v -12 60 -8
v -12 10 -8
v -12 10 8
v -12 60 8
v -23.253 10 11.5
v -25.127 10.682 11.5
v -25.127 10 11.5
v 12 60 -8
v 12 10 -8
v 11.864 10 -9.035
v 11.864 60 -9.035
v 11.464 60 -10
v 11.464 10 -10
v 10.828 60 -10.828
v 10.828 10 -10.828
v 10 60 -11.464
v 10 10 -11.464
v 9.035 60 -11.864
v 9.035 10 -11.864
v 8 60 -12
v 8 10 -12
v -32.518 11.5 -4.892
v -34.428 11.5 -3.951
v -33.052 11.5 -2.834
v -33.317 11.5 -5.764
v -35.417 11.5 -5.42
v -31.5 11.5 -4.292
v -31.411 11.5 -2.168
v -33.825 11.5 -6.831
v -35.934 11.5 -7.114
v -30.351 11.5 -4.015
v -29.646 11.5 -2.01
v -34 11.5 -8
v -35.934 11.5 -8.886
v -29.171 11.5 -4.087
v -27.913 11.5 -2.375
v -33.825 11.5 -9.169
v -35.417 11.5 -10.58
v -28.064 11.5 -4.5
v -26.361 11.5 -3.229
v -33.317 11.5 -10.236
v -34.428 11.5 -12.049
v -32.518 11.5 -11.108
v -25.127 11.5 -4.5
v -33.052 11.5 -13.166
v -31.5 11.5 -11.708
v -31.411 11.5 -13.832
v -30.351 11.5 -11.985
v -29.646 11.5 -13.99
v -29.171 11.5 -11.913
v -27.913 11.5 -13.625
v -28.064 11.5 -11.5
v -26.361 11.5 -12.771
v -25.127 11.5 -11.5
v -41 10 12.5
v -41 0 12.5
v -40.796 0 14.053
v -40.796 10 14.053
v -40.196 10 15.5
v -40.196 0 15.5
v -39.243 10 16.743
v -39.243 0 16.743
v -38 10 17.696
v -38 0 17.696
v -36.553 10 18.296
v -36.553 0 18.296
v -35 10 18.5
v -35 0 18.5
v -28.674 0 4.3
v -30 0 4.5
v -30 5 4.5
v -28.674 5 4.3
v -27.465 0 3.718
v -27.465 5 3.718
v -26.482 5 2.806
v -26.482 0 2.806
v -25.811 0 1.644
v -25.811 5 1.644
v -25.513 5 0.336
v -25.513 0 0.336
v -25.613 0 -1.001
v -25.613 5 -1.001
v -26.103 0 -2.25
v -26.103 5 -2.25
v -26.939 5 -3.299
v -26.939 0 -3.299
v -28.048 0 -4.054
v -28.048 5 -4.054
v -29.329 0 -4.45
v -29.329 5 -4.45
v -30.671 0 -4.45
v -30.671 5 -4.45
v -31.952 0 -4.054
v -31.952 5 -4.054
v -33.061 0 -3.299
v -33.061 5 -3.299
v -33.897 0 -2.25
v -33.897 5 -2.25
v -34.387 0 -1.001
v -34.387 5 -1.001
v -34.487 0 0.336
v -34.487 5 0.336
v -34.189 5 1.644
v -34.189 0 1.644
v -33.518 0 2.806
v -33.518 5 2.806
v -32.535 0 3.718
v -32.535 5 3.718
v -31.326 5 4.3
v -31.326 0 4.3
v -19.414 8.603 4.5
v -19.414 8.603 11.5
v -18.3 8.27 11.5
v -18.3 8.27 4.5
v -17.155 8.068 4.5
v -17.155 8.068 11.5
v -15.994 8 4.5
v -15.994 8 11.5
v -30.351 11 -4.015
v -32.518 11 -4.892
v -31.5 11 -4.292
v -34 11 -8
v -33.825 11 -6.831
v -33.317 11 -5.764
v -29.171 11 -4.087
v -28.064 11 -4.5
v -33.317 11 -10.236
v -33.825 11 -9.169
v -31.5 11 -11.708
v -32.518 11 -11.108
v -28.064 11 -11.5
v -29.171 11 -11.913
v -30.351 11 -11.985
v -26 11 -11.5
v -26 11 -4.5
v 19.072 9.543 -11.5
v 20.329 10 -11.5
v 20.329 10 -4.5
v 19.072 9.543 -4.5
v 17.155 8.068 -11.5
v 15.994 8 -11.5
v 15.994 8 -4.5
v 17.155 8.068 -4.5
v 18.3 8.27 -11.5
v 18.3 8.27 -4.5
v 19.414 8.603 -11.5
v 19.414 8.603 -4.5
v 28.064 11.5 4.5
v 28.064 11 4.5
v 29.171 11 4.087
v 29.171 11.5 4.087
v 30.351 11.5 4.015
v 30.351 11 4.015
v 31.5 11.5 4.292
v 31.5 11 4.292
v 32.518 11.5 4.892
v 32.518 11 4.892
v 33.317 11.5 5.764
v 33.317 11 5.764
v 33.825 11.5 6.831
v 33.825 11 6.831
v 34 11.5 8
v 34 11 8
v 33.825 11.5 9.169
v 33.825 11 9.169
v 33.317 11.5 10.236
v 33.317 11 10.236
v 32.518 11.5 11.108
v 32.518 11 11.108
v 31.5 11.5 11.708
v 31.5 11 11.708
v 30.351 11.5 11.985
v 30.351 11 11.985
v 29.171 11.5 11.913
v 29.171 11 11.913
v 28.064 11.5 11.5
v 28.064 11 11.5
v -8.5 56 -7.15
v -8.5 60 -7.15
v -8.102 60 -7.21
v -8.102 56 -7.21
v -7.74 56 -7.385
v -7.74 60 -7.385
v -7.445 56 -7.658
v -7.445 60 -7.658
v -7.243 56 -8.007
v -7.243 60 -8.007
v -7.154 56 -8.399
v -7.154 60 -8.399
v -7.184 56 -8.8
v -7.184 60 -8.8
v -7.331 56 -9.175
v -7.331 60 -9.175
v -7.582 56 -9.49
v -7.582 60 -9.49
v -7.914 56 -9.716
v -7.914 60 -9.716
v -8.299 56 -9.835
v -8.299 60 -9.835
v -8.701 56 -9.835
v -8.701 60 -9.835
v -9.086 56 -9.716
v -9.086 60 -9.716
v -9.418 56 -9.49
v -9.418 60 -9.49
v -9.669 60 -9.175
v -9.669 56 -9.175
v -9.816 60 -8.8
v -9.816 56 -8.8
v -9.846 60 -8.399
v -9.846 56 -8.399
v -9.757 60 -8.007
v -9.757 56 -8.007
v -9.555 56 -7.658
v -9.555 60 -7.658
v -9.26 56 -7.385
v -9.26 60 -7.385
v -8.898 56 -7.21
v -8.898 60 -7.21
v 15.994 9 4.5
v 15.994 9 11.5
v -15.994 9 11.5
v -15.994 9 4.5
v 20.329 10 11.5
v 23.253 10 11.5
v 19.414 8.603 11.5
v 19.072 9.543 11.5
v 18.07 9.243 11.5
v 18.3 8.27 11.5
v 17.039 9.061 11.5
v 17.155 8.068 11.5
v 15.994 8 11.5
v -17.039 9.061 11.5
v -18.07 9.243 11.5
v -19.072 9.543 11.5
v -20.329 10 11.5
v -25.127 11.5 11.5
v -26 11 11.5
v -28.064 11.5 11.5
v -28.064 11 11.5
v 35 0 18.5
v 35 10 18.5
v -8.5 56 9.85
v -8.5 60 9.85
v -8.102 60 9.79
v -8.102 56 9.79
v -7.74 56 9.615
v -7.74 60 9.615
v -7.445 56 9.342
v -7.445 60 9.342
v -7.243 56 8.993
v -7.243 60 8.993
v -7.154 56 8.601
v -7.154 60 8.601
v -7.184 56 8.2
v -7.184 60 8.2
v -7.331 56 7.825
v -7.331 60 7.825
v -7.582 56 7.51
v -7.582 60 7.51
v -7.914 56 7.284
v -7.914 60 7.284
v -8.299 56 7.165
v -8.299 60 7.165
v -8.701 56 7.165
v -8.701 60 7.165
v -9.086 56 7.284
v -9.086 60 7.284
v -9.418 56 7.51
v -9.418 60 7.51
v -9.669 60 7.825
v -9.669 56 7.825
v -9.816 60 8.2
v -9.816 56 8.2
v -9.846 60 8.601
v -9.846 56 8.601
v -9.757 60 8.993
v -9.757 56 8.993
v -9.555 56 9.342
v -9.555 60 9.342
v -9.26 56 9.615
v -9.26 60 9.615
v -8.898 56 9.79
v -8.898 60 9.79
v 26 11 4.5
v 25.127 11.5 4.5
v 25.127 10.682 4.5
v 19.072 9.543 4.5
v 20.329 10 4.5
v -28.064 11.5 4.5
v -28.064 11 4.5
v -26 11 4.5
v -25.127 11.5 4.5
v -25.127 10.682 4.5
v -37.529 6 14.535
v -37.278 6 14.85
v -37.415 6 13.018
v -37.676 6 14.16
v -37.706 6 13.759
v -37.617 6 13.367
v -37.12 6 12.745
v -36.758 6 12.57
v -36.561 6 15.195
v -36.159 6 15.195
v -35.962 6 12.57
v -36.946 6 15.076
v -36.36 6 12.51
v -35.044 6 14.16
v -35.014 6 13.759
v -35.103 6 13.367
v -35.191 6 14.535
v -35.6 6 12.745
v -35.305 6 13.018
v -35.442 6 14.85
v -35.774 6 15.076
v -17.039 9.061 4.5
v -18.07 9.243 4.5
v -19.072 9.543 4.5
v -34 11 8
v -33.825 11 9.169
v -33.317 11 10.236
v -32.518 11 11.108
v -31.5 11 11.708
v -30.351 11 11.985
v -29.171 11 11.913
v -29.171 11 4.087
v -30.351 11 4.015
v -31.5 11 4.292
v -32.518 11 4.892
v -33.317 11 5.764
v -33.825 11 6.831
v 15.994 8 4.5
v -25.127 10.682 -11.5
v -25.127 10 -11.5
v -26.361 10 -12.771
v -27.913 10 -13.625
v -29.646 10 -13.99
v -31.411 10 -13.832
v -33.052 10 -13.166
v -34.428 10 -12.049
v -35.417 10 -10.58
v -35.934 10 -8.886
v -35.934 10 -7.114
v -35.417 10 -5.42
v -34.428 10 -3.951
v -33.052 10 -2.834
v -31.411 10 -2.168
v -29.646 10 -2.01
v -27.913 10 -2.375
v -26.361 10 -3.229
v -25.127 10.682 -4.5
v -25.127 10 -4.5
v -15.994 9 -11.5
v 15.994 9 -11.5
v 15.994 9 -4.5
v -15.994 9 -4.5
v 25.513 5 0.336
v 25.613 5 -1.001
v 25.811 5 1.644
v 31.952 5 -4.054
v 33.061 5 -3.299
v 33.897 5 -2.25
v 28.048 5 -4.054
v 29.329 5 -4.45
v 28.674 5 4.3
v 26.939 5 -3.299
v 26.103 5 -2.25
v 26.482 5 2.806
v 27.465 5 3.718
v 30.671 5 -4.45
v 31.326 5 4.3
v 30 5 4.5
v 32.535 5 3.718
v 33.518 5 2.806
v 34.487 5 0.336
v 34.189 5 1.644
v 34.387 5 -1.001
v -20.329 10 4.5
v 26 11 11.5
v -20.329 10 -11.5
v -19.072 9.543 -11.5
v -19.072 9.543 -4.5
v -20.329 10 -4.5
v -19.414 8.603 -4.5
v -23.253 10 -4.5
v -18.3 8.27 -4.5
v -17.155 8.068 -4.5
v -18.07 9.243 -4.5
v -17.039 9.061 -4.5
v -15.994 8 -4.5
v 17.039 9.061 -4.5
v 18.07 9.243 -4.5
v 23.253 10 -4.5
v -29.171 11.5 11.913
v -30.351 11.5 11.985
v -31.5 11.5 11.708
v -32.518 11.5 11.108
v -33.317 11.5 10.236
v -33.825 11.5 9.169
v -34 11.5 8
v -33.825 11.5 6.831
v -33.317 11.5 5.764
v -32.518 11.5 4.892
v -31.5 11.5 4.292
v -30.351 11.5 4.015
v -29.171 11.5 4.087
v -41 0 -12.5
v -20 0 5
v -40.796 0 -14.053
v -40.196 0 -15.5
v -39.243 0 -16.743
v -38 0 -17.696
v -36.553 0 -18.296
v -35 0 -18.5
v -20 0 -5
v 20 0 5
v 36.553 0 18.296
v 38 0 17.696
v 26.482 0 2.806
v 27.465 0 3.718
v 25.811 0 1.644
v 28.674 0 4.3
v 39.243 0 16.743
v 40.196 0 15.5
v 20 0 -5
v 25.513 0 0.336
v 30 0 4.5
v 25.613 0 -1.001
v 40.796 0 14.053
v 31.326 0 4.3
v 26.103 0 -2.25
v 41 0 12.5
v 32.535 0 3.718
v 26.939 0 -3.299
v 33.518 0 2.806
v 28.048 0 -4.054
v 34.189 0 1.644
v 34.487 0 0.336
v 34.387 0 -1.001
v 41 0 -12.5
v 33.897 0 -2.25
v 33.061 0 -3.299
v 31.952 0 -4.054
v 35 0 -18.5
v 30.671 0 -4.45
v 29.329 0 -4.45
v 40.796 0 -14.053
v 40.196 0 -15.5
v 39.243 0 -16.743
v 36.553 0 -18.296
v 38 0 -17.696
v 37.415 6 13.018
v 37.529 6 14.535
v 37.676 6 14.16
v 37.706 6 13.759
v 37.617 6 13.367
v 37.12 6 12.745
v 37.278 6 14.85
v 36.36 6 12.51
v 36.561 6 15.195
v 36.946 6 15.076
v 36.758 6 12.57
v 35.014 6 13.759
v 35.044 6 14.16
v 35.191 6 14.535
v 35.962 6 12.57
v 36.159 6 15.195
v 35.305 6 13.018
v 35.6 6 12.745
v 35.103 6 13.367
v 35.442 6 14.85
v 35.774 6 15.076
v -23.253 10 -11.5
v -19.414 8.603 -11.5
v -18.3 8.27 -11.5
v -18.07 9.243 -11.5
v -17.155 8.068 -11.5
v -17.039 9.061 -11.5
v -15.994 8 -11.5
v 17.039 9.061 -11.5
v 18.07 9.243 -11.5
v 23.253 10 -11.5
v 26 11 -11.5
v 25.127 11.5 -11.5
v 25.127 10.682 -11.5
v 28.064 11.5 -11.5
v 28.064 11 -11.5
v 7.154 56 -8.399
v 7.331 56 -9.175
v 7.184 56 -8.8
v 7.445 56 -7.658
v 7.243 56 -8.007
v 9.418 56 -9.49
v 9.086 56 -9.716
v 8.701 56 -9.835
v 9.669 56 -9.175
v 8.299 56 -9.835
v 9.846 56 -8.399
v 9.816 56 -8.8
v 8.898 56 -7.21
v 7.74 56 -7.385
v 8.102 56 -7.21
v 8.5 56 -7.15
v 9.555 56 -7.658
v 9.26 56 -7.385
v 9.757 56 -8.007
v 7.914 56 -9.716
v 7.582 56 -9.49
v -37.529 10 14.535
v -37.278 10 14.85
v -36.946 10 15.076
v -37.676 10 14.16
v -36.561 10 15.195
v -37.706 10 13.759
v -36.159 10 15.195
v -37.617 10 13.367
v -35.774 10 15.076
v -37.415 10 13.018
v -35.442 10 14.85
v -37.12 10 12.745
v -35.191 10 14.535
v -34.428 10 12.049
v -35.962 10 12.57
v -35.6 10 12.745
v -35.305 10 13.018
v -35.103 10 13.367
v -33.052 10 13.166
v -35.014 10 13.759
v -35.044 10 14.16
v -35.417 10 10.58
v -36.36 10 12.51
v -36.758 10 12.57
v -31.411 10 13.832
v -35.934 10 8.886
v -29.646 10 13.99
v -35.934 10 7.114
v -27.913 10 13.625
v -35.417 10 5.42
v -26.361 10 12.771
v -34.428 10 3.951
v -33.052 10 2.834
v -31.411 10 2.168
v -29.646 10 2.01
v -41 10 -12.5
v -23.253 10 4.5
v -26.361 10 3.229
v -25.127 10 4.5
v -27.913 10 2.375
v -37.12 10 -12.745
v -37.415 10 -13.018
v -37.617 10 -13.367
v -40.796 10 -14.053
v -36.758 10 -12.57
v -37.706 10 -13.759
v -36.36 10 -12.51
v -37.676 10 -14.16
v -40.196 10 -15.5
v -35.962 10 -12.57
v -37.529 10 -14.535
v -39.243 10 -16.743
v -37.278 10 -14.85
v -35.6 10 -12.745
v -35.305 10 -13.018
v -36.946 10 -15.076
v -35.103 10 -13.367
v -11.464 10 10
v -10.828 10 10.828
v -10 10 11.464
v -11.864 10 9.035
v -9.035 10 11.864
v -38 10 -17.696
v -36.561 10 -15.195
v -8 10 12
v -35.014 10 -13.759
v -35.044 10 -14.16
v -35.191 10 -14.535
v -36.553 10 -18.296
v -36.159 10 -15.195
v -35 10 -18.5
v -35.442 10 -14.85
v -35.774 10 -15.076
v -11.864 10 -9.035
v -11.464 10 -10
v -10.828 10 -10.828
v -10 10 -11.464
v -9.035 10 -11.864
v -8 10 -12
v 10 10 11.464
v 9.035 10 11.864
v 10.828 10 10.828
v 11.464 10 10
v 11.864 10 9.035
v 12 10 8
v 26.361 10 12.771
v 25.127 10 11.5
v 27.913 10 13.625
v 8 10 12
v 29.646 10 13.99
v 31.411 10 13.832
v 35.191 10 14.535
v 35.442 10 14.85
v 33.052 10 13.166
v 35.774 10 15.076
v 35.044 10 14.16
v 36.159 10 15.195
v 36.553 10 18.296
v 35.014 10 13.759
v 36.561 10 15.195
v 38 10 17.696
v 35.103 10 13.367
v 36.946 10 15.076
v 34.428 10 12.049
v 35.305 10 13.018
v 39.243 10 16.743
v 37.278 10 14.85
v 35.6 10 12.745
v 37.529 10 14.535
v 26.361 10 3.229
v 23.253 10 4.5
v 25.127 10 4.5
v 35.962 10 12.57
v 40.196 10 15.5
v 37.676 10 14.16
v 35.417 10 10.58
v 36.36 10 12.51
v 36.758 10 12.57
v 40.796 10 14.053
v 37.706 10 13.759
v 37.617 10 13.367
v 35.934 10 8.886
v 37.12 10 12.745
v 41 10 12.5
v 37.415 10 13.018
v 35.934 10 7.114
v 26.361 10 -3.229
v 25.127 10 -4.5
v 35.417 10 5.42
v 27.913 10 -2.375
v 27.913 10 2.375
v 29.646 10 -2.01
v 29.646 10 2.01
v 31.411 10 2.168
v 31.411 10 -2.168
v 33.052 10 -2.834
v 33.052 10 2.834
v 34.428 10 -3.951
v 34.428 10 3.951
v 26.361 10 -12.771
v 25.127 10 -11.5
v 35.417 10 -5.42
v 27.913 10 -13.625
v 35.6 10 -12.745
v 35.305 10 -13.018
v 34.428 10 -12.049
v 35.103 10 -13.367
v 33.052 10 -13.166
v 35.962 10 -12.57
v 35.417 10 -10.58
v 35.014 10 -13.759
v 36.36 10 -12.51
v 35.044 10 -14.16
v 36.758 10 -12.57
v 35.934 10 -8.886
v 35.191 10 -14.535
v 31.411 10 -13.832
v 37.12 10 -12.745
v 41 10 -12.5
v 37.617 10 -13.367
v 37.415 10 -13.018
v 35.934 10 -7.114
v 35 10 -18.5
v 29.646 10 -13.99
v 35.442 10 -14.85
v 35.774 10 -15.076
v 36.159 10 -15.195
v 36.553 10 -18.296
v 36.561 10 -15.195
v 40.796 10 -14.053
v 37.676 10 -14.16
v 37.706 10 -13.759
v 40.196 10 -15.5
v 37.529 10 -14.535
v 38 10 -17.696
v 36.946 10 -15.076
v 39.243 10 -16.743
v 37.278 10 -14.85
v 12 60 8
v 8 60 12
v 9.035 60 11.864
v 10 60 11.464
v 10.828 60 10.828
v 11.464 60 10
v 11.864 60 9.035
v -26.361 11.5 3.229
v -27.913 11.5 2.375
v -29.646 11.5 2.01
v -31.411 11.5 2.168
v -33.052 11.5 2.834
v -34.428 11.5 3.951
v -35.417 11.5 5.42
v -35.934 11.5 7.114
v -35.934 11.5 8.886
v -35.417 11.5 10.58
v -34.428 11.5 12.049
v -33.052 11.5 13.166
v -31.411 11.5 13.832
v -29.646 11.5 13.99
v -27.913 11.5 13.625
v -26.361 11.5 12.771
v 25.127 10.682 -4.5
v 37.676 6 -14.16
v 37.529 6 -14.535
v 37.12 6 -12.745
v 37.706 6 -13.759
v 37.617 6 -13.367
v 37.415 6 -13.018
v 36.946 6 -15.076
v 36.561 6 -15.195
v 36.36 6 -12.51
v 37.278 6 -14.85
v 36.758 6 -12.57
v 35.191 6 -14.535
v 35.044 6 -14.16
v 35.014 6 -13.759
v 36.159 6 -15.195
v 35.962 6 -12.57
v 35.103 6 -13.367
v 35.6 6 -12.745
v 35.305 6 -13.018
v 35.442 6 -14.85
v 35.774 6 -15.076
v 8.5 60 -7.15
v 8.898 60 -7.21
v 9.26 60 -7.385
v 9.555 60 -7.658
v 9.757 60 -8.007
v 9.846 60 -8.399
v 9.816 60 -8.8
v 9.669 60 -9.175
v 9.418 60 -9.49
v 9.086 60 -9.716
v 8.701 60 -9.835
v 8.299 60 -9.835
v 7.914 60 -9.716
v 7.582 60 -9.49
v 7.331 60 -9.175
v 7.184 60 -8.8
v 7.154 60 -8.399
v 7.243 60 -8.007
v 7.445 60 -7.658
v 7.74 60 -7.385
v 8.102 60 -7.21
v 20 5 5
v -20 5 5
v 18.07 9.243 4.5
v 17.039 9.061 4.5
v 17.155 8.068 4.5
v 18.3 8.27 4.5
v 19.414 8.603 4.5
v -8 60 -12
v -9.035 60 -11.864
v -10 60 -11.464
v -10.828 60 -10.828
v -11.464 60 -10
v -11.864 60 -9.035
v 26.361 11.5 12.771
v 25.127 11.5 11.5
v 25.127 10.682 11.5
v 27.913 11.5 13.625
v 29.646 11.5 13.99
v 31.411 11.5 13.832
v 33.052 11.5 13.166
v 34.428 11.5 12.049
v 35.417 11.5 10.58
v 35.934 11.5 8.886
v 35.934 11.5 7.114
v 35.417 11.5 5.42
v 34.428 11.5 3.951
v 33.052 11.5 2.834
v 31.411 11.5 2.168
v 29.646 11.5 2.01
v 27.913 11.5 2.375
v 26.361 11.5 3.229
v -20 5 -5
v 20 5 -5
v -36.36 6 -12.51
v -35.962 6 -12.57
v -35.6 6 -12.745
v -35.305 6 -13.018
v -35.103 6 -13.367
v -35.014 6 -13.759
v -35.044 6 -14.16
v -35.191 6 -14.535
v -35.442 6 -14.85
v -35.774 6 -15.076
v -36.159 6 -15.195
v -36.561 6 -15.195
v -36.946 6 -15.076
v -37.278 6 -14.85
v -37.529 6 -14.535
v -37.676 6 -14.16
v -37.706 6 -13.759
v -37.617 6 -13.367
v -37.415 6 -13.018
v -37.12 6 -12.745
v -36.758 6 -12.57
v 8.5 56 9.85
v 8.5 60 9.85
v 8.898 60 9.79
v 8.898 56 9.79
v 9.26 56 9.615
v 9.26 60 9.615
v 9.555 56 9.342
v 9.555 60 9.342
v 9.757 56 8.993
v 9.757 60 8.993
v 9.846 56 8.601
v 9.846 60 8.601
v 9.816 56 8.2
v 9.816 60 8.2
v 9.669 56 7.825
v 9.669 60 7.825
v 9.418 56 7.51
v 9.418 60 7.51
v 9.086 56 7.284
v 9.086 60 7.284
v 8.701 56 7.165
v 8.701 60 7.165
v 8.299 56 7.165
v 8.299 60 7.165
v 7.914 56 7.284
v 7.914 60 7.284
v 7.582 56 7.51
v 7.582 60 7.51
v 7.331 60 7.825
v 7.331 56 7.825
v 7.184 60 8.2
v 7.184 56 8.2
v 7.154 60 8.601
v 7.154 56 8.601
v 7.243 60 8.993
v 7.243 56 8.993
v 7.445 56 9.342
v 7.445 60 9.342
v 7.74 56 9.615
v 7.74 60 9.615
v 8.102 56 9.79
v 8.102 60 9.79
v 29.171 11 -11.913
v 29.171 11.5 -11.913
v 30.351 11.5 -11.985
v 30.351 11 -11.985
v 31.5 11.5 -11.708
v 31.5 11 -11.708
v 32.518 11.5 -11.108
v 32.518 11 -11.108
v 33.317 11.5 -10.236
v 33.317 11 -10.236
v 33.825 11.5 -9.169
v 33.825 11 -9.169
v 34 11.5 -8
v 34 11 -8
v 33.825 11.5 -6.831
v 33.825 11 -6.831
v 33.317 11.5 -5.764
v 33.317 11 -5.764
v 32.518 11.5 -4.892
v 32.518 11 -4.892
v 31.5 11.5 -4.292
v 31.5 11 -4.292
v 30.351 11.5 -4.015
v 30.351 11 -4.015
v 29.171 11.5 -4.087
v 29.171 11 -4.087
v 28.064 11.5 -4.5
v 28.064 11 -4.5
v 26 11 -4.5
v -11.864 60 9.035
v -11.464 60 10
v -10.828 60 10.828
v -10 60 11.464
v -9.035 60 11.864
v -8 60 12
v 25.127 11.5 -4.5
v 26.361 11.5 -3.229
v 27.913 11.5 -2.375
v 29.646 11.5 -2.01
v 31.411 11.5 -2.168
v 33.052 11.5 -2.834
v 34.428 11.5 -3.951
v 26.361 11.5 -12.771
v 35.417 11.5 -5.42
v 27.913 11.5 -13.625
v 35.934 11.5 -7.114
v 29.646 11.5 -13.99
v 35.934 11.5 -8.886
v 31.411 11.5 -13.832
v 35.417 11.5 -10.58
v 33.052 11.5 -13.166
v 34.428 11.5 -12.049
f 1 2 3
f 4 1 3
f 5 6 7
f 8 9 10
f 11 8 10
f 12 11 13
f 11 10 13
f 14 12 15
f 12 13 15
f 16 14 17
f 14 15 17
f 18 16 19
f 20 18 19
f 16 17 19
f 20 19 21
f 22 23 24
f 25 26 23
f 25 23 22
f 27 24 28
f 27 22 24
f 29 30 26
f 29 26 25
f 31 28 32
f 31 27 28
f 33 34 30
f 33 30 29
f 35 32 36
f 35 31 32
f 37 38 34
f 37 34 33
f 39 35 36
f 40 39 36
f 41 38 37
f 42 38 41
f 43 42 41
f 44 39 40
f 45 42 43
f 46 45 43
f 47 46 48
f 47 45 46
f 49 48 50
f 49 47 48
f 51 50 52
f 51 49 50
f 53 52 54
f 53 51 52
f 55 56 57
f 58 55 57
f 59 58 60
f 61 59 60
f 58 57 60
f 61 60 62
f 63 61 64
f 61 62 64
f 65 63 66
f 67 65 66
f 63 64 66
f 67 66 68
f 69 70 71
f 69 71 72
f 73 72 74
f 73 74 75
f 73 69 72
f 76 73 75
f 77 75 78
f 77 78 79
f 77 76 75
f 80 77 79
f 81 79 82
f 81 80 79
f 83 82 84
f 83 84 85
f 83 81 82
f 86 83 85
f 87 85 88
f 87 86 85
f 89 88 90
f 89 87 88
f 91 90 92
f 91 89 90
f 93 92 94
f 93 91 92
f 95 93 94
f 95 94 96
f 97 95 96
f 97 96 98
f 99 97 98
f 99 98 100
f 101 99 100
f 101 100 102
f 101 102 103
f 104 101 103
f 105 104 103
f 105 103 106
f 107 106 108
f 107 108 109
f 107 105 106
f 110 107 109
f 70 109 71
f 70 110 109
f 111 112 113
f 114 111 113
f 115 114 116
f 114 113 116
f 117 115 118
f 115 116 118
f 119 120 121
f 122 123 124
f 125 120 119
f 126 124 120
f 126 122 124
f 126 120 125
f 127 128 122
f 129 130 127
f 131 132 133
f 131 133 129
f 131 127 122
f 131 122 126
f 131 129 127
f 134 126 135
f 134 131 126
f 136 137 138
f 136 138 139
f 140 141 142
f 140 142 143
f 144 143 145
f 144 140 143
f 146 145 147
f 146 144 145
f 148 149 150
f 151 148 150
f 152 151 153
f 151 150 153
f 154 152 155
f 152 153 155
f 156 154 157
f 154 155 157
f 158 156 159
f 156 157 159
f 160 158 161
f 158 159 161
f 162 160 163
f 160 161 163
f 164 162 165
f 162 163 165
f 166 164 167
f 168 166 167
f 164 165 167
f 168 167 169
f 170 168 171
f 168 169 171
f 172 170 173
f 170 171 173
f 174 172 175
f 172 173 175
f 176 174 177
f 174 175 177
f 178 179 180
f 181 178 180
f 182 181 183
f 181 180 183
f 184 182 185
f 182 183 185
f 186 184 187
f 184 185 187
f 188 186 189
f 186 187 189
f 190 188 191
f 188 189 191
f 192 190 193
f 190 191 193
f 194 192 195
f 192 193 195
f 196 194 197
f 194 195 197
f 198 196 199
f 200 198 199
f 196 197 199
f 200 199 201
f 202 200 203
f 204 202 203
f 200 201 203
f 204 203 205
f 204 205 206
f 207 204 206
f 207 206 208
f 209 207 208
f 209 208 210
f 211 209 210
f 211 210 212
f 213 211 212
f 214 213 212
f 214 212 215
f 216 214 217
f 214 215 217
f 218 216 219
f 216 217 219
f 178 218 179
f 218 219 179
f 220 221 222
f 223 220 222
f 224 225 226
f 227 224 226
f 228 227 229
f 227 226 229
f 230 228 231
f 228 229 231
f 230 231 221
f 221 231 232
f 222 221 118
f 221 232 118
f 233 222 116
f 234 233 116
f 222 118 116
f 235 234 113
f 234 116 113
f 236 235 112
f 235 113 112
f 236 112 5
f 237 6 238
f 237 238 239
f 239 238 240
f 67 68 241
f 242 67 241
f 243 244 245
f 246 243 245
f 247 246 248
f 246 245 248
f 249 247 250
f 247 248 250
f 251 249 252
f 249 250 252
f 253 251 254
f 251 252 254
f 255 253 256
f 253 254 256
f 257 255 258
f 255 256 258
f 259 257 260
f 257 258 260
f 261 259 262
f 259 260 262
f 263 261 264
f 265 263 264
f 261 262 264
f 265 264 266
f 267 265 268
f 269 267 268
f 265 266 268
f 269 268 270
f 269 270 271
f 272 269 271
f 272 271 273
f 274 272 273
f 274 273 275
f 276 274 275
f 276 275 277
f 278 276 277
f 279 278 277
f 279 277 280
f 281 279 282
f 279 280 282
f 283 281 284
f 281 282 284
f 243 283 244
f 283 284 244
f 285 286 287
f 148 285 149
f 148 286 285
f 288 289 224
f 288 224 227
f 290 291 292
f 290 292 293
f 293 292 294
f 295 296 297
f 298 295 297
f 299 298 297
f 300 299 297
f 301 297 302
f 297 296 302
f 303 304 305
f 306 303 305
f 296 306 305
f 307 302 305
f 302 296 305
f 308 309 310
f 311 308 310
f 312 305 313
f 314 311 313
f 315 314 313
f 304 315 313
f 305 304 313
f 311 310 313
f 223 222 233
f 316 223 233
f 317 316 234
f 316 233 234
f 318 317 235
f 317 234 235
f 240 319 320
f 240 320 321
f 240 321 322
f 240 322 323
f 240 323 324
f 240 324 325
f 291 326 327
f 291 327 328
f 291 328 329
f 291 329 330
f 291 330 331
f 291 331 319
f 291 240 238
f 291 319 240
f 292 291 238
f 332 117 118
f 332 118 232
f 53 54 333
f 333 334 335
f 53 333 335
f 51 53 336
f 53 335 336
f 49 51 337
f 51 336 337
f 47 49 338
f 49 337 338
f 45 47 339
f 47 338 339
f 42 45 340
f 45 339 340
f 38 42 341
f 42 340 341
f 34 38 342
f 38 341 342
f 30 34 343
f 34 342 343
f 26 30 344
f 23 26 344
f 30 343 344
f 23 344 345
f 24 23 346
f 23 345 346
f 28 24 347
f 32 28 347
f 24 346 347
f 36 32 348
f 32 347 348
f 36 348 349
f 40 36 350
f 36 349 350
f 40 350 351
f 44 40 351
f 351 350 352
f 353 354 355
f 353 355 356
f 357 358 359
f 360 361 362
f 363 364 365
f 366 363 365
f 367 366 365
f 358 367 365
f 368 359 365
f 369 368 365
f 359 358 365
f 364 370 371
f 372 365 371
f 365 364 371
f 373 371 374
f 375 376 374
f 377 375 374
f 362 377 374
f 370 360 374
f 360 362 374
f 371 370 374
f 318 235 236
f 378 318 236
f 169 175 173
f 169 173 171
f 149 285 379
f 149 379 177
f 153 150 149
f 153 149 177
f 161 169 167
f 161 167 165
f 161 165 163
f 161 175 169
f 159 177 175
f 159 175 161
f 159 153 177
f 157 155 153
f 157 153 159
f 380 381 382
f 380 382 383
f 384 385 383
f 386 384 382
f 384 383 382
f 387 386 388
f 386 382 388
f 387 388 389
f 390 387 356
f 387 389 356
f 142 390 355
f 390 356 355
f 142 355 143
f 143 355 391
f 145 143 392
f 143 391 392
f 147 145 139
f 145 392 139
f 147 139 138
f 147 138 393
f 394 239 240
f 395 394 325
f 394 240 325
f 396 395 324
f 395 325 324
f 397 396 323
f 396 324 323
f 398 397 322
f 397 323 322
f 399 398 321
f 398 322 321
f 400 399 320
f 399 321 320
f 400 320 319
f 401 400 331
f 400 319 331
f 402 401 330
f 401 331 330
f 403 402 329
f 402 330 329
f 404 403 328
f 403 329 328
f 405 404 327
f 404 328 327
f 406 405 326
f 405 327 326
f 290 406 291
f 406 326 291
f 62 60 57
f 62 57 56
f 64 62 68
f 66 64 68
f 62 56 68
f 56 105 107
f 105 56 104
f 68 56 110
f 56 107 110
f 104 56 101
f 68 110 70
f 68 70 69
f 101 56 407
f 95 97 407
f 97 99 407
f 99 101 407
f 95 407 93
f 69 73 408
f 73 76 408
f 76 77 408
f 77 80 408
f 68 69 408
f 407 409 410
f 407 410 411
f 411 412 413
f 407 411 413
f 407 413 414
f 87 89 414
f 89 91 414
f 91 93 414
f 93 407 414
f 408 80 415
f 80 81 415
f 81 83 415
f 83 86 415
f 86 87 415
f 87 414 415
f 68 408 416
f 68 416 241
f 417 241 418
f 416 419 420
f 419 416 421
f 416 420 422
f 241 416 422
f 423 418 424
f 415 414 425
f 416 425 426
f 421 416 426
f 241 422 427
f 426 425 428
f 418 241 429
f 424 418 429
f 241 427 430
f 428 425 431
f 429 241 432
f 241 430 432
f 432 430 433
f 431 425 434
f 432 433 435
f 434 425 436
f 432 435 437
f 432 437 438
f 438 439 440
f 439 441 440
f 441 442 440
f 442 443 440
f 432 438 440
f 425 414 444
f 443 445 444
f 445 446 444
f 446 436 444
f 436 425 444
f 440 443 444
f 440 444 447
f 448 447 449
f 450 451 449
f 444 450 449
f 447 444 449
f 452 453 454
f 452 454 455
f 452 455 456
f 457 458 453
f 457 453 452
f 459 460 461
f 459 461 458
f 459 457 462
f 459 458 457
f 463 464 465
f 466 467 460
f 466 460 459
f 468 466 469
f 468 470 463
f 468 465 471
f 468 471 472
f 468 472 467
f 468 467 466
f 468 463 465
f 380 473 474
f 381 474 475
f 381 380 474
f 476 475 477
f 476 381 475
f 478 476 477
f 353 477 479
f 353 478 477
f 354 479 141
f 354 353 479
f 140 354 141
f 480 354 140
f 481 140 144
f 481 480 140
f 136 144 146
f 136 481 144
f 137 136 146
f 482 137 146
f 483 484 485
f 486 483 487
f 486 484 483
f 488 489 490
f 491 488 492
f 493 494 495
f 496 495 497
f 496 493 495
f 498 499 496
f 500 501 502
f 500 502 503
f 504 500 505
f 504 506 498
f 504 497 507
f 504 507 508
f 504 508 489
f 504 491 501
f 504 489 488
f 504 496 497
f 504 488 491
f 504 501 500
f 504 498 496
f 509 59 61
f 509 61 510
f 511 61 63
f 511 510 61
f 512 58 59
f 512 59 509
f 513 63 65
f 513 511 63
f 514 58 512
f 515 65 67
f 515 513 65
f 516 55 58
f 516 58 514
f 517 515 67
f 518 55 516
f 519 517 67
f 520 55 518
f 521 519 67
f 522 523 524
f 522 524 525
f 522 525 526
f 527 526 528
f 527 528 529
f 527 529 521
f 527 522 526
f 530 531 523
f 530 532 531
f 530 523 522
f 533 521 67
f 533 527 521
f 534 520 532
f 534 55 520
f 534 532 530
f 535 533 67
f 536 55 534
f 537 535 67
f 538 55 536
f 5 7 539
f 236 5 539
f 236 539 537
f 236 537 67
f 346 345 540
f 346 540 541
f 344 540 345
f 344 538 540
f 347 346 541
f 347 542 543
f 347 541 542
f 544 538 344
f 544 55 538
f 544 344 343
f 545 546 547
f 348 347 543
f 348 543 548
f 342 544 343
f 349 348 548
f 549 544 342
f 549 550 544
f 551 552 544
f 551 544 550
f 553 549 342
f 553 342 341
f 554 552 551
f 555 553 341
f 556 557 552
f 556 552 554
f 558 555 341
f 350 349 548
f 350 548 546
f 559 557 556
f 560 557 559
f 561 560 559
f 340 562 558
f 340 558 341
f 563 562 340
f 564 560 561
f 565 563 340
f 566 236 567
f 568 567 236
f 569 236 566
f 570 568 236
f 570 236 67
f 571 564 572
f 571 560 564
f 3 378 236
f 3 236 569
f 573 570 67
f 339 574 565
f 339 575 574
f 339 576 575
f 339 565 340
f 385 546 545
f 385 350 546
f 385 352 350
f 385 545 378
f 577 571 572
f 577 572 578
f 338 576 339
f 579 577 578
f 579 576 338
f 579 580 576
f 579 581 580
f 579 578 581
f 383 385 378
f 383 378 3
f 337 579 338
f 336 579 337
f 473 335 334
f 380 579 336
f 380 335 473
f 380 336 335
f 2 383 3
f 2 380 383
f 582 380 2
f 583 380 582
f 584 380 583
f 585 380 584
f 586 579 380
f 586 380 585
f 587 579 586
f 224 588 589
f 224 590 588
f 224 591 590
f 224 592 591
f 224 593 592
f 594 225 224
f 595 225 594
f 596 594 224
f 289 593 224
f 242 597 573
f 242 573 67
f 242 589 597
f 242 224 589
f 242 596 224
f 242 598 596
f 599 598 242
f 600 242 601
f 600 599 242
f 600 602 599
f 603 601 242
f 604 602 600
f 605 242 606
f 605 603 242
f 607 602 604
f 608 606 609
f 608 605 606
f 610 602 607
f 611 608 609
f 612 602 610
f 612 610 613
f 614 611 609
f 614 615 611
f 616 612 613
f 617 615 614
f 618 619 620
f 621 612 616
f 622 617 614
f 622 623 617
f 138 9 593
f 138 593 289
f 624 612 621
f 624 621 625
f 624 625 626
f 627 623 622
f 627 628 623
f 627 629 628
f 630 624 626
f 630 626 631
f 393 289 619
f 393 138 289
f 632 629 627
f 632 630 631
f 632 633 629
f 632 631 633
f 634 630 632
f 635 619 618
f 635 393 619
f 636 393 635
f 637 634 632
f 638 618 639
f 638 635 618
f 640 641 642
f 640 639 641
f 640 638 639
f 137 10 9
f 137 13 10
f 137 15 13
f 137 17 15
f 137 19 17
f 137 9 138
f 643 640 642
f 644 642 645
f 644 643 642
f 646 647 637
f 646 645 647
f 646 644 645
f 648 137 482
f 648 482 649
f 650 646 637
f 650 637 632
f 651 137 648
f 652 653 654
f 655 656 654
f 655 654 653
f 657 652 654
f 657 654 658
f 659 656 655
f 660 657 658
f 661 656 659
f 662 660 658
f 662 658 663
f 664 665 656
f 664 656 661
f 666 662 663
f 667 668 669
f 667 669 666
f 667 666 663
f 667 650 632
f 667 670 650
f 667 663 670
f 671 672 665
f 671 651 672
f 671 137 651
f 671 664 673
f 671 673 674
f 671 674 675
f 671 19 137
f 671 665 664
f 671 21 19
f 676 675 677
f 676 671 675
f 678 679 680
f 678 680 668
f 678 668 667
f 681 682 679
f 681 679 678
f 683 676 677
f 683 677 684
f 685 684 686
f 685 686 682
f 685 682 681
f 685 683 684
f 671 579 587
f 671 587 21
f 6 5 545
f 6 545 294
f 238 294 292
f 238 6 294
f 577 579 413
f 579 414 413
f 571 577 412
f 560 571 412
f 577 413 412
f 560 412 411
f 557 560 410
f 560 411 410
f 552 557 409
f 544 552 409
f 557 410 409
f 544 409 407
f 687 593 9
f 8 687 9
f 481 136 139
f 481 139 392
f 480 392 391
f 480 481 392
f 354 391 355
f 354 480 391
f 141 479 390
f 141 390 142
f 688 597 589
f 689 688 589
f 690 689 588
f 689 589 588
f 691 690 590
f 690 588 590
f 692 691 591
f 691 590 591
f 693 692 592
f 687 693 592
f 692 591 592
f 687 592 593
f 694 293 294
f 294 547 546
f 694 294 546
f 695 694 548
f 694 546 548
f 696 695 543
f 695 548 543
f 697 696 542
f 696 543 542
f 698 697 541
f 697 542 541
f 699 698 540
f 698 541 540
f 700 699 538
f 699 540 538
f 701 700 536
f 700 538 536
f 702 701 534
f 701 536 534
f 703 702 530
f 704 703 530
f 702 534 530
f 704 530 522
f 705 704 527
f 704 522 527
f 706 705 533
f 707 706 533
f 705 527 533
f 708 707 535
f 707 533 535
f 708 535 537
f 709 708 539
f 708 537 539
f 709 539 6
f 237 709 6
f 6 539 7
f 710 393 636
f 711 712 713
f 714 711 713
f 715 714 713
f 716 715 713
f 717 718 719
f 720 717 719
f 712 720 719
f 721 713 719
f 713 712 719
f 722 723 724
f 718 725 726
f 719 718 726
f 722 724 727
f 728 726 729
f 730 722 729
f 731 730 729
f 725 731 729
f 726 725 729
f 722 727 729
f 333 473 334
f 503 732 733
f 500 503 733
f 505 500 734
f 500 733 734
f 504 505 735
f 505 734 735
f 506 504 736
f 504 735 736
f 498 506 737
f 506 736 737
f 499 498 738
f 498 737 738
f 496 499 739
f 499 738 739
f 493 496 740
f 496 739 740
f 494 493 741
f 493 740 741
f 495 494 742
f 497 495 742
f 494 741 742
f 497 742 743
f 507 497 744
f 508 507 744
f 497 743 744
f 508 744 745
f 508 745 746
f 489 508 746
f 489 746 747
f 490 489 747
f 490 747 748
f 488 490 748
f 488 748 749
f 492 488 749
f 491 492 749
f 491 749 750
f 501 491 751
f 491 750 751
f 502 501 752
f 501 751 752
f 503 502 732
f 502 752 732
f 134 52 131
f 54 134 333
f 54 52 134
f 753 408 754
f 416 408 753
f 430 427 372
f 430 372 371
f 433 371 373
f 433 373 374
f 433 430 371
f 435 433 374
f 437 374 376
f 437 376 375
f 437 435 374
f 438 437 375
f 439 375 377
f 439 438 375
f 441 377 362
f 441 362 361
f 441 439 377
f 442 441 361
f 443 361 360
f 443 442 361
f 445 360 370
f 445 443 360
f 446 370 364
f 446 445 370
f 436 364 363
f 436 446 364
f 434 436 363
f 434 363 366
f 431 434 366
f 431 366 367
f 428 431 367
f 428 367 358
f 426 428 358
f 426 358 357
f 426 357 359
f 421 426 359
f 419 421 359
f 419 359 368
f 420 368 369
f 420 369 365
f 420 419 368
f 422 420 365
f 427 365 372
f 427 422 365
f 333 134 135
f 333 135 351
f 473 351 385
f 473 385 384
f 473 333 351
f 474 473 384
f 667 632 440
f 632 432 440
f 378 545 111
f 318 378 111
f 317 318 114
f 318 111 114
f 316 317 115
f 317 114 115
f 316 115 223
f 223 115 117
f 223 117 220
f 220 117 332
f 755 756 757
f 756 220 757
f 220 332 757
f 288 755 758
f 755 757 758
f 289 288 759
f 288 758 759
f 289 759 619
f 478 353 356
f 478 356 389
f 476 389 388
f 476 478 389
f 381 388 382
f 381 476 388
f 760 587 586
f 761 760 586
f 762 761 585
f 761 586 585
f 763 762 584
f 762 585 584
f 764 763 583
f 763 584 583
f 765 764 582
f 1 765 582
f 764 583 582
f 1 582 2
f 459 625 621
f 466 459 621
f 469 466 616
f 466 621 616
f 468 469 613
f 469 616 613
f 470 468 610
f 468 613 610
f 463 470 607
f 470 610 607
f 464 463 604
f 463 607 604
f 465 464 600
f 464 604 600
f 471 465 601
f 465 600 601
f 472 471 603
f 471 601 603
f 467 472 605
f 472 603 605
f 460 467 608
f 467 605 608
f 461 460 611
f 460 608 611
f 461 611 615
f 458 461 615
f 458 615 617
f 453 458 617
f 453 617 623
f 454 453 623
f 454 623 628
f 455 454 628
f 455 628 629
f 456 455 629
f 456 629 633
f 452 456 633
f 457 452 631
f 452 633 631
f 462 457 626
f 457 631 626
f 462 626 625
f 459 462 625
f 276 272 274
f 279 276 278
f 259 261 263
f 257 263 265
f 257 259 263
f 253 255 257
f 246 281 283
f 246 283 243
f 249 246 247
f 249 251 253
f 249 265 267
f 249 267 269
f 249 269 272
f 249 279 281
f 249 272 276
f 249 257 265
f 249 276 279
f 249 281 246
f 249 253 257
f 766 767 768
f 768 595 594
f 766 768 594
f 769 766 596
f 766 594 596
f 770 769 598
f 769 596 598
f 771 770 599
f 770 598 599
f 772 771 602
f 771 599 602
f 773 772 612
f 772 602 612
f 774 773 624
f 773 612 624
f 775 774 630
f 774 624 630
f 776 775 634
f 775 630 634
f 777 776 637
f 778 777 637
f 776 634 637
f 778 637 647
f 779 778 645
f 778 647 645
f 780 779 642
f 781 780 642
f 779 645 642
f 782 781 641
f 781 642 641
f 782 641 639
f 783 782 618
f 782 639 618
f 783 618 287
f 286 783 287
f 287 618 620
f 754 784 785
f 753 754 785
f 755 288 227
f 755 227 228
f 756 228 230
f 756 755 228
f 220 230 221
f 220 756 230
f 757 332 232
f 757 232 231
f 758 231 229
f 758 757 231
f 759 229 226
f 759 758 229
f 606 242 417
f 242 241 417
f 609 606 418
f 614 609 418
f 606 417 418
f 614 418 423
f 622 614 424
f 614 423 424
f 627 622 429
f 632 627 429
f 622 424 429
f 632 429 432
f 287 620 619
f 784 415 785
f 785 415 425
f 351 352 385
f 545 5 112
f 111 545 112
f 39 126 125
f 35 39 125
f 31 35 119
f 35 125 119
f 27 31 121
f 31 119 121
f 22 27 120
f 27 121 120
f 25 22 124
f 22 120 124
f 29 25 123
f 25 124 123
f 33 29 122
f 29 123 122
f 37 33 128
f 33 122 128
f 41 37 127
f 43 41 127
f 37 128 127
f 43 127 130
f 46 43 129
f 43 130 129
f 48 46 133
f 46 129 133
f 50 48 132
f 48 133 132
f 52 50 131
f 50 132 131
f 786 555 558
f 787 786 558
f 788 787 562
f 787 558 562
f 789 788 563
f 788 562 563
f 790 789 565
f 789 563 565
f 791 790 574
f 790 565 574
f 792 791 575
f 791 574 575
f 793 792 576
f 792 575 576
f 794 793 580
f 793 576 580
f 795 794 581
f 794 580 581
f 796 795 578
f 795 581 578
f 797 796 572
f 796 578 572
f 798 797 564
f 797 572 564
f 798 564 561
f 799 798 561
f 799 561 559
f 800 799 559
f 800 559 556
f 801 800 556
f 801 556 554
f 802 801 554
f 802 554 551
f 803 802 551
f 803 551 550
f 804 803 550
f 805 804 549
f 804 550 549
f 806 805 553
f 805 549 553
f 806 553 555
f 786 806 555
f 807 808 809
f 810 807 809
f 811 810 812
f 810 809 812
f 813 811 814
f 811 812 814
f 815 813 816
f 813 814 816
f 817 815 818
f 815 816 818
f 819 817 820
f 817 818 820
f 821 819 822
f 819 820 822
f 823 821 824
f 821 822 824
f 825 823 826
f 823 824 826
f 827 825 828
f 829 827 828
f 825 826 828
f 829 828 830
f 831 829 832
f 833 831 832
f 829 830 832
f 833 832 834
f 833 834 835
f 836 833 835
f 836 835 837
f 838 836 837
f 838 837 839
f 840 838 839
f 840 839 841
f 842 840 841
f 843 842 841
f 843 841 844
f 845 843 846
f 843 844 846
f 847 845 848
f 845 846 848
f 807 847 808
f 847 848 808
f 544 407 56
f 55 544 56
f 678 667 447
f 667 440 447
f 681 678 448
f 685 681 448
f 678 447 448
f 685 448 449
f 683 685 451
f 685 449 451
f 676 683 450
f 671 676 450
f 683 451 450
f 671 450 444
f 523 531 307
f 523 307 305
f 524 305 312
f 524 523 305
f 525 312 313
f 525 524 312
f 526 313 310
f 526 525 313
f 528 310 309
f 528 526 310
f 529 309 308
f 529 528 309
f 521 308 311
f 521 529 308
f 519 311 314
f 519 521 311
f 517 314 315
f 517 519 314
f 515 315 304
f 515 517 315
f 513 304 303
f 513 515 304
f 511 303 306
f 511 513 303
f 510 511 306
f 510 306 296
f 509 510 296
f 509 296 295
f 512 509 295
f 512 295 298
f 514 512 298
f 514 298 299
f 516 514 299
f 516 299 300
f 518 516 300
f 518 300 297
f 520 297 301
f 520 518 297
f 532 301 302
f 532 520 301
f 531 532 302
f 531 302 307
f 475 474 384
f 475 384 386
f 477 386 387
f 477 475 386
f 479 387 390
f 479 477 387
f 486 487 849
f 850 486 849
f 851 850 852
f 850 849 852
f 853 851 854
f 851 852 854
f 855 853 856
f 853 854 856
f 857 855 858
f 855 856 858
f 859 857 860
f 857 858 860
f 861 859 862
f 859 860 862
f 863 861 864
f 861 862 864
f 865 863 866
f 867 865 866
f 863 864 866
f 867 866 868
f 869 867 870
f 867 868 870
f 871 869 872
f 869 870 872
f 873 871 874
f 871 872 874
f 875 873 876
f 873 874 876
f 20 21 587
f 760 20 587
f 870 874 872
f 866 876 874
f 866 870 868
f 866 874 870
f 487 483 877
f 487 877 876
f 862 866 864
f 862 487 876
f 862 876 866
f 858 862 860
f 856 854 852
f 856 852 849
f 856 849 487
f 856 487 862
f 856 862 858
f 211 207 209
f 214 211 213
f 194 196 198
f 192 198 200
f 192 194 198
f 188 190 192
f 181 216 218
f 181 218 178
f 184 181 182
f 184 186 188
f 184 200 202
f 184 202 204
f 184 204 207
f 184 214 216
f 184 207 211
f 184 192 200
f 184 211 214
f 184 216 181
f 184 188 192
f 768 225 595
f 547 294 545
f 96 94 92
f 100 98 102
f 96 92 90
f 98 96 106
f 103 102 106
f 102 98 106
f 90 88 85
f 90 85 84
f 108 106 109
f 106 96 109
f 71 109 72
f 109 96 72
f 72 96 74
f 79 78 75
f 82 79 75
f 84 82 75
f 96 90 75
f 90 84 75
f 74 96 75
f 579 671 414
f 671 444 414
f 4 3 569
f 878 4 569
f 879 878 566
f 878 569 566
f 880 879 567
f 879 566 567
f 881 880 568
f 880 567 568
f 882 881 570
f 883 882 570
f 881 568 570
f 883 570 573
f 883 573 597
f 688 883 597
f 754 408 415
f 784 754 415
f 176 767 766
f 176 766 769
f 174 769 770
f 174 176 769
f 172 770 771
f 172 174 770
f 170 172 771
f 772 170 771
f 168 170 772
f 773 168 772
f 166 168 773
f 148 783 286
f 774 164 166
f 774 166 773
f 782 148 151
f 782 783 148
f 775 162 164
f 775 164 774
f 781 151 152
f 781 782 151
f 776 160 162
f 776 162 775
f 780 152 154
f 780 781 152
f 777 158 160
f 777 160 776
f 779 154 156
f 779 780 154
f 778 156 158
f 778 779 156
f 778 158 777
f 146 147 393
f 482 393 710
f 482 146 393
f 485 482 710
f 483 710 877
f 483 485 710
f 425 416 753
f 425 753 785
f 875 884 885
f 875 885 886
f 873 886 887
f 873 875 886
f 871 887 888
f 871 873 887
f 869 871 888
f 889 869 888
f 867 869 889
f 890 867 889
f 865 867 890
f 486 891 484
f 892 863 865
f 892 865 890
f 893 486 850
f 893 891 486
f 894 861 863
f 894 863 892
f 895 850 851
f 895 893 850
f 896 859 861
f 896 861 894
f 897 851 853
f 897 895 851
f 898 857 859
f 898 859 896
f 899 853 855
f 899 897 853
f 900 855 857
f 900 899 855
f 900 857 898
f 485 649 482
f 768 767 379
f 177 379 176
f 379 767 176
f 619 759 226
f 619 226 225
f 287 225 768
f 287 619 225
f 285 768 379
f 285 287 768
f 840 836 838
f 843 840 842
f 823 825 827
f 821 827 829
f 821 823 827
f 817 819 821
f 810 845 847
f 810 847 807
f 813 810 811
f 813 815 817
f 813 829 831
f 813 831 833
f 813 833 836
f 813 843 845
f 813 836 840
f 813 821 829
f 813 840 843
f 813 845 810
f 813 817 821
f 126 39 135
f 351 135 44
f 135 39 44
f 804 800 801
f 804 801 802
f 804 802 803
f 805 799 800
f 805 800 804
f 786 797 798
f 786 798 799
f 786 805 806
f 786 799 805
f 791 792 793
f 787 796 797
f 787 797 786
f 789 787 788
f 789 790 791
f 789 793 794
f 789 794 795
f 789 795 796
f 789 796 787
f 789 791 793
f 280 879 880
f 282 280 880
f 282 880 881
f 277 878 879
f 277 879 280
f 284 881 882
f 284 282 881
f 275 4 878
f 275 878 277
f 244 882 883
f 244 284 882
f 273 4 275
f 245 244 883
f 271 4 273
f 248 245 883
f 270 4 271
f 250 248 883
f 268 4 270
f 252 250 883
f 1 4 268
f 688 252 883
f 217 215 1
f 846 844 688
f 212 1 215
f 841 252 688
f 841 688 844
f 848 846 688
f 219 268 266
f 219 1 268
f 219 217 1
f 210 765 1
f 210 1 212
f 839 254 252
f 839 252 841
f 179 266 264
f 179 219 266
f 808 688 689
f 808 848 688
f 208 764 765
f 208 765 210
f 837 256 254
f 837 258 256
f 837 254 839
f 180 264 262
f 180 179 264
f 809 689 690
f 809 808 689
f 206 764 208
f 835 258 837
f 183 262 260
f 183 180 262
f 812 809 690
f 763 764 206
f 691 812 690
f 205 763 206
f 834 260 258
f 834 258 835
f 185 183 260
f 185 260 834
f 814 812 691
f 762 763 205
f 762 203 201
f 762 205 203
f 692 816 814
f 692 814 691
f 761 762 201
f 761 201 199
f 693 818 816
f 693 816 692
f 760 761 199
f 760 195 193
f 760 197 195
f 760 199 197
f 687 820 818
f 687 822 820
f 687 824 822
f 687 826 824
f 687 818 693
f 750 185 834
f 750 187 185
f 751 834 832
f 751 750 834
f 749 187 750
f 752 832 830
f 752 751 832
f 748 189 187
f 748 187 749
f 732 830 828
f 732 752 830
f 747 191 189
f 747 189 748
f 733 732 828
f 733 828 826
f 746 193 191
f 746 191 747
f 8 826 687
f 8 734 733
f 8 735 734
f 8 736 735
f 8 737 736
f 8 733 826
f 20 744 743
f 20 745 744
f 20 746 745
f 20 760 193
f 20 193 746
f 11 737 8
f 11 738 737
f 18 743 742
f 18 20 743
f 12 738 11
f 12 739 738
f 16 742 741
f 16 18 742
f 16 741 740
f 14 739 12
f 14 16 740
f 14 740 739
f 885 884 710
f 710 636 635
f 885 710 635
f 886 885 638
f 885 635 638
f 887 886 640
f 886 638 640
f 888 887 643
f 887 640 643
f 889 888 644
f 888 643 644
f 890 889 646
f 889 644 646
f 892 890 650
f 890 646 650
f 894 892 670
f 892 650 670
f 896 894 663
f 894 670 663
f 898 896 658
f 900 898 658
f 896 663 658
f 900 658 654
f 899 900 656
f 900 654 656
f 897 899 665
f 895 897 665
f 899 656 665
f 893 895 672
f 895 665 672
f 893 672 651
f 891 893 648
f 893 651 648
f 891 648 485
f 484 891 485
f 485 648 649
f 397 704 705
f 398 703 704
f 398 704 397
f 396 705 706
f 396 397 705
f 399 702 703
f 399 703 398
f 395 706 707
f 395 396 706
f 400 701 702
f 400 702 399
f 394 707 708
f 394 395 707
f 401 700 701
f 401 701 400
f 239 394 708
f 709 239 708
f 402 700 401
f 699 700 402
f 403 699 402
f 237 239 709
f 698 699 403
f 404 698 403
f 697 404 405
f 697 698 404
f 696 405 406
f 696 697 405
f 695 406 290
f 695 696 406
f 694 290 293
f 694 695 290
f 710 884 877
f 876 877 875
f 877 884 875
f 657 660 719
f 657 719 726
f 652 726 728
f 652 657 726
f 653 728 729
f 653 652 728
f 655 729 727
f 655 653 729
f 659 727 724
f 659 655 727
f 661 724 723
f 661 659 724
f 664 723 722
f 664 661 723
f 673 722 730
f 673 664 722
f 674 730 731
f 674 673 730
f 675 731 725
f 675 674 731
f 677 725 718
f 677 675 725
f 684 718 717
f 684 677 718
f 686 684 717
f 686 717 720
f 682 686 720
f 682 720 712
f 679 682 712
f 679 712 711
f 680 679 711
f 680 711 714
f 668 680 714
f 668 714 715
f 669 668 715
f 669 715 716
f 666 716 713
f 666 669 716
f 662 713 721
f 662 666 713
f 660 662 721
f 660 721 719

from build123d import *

# Parameters (mm, degrees)
BOSS_EXTRUDE1_DEPTH                        = 10
BOSS_EXTRUDE2_START                        = 10
SKETCH4_R                                  = 4
BOSS_EXTRUDE2_DEPTH                        = 1
BOSS_EXTRUDE4_START                        = 11.5
BOSS_EXTRUDE4_DEPTH                        = 7
CUT_EXTRUDE2_START                         = 11.5
CUT_EXTRUDE2_DEPTH                         = 7
BOSS_EXTRUDE3_START                        = 10
BOSS_EXTRUDE3_DEPTH                        = 1.5
MIRROR4_DEPTH                              = 8
MIRROR4_START                              = 8
MIRROR4_2_DEPTH                            = 2
MIRROR4_START_2                            = 10
MIRROR4_3_DEPTH                            = 1.5
MIRROR4_4_DEPTH                            = 3
MIRROR4_START_3                            = -11.5
MIRROR4_5_DEPTH                            = 7
MIRROR4_START_4                            = 4.5
MIRROR4_6_DEPTH                            = 7
SKETCH2_R                                  = 4.5
SKETCH2_W                                  = 40
SKETCH2_H                                  = 10
CUT_EXTRUDE1_DEPTH                         = 5
BOSS_EXTRUDE5_START                        = 10
BOSS_EXTRUDE5_DEPTH                        = 50
SKETCH8_R                                  = 1.35
CUT_EXTRUDE3_DEPTH                         = 4
SKETCH9_R                                  = 1.35
CUT_EXTRUDE4_DEPTH                         = 4
MIRROR5_AT_THE_SECOND_PLANE_COPY_1_SKETC_R = 1.35
MIRROR5_AT_THE_SECOND_PLANE_COPY_1_DEPTH   = 4


with BuildPart() as part:
    # Sketch3 → Boss-Extrude1 (new body)
    with BuildSketch(Plane(origin=(0, 0, 0), x_dir=(1, 0, 0), z_dir=(0, 1, 0))):
        with BuildLine():
            Line((-41, 0), (-41, -12.5))
            ThreePointArc((-41, -12.5), (-39.242640687, -16.742640687), (-35, -18.5))
            Line((-35, -18.5), (0, -18.5))
            Line((0, -18.5), (0, 0))
            Line((0, 0), (-41, 0))
        make_face()
    extrude(amount=BOSS_EXTRUDE1_DEPTH)

    # Sketch4 → Boss-Extrude2 (add)
    with BuildSketch(Plane(origin=(0, 0, 0), x_dir=(1, 0, 0), z_dir=(0, 1, 0)).offset(BOSS_EXTRUDE2_START)):
        with Locations((-30, -8)):
            Circle(SKETCH4_R)
        with BuildLine():
            Line((-26, -4.5), (-28.063508327, -4.5))
            ThreePointArc((-28.063508327, -4.5), (-26.554280431, -5.968493994), (-26, -8))
            Line((-26, -8), (-26, -4.5))
        make_face()
        with BuildLine():
            Line((-26, -11.5), (-26, -8))
            ThreePointArc((-26, -8), (-26.554280431, -10.031506006), (-28.063508327, -11.5))
            Line((-28.063508327, -11.5), (-26, -11.5))
        make_face()
    extrude(amount=BOSS_EXTRUDE2_DEPTH)

    # Sketch6 → Boss-Extrude4 (add)
    with BuildSketch(Plane.XY.offset(BOSS_EXTRUDE4_START)):
        Polygon((-23.252522581, 10), (-26, 11), (-26, 10), align=None)
    extrude(amount=-BOSS_EXTRUDE4_DEPTH)

    # Sketch6<3> → Cut-Extrude2 (cut)
    with BuildSketch(Plane.XY.offset(CUT_EXTRUDE2_START)):
        with BuildLine():
            Line((-20.32871818, 10), (-23.252522581, 10))
            Line((-23.252522581, 10), (-19.414499368, 8.603073792))
            ThreePointArc((-19.414499368, 8.603073792), (-17.730779711, 8.15192247), (-15.994297935, 8))
            Line((-15.994297935, 8), (0, 8))
            Line((0, 8), (0, 9))
            Line((0, 9), (-15.994297935, 9))
            ThreePointArc((-15.994297935, 9), (-17.557131534, 9.136730223), (-19.072479224, 9.542766413))
            Line((-19.072479224, 9.542766413), (-20.32871818, 10))
        make_face()
    extrude(amount=-CUT_EXTRUDE2_DEPTH, mode=Mode.SUBTRACT)

    # Sketch4<3> → Boss-Extrude3 (add)
    with BuildSketch(Plane(origin=(0, 0, 0), x_dir=(1, 0, 0), z_dir=(0, 1, 0)).offset(BOSS_EXTRUDE3_START)):
        with BuildLine():
            ThreePointArc((-28.063508327, -11.5), (-34, -8), (-28.063508327, -4.5))
            Line((-28.063508327, -4.5), (-26, -4.5))
            Line((-26, -4.5), (-25.126602828, -4.5))
            ThreePointArc((-25.126602828, -4.5), (-36, -8), (-25.126602828, -11.5))
            Line((-25.126602828, -11.5), (-26, -11.5))
            Line((-26, -11.5), (-28.063508327, -11.5))
        make_face()
    extrude(amount=BOSS_EXTRUDE3_DEPTH)

    # Mirror4: read off the stored shape, not the designer's step
    # Mirror4 outline → Mirror4 (add)
    with BuildSketch(Plane(origin=(0, 0, 0), x_dir=(1, 0, 0), z_dir=(0, 1, 0))):
        with BuildLine():
            Line((0, -18.5), (35, -18.5))
            ThreePointArc((35, -18.5), (39.242640687, -16.742640687), (41, -12.5))
            Line((41, -12.5), (41, 12.5))
            ThreePointArc((41, 12.5), (39.242640687, 16.742640687), (35, 18.5))
            Line((35, 18.5), (-35, 18.5))
            ThreePointArc((-35, 18.5), (-39.242640687, 16.742640687), (-41, 12.5))
            Line((-41, 12.5), (-41, 0))
            Line((-41, 0), (0, 0))
            Line((0, 0), (0, -18.5))
        make_face()
    extrude(amount=MIRROR4_DEPTH)

    # Mirror4 2 outline → Mirror4 2 (add)
    with BuildSketch(Plane(origin=(0, 0, 0), x_dir=(1, 0, 0), z_dir=(0, 1, 0)).offset(MIRROR4_START)):
        with BuildLine():
            Line((0, -11.5), (0, -18.5))
            Line((0, -18.5), (35, -18.5))
            ThreePointArc((35, -18.5), (39.242640687, -16.742640687), (41, -12.5))
            Line((41, -12.5), (41, 12.5))
            ThreePointArc((41, 12.5), (39.242640687, 16.742640687), (35, 18.5))
            Line((35, 18.5), (-35, 18.5))
            ThreePointArc((-35, 18.5), (-39.242640687, 16.742640687), (-41, 12.5))
            Line((-41, 12.5), (-41, 0))
            Line((-41, 0), (0, 0))
            Line((0, 0), (0, -4.5))
            Line((0, -4.5), (28.063508327, -4.5))
            ThreePointArc((28.063508327, -4.5), (34, -8), (28.063508327, -11.5))
            Line((28.063508327, -11.5), (0, -11.5))
        make_face()
        with BuildLine():
            ThreePointArc((28.063508327, 11.5), (34, 8), (28.063508327, 4.5))
            Line((28.063508327, 4.5), (-28.063508327, 4.5))
            ThreePointArc((-28.063508327, 4.5), (-34, 8), (-28.063508327, 11.5))
            Line((-28.063508327, 11.5), (28.063508327, 11.5))
        make_face(mode=Mode.SUBTRACT)
    extrude(amount=MIRROR4_2_DEPTH)

    # Mirror4 3 outline → Mirror4 3 (add)
    with BuildSketch(Plane(origin=(0, 0, 0), x_dir=(1, 0, 0), z_dir=(0, 1, 0)).offset(MIRROR4_START_2)):
        with BuildLine():
            Line((28.063508327, -11.5), (25.126602828, -11.5))
            ThreePointArc((25.126602828, -11.5), (36, -8), (25.126602828, -4.5))
            Line((25.126602828, -4.5), (28.063508327, -4.5))
            ThreePointArc((28.063508327, -4.5), (34, -8), (28.063508327, -11.5))
        make_face()
        with BuildLine():
            Line((-28.063508327, 11.5), (-25.126602828, 11.5))
            ThreePointArc((-25.126602828, 11.5), (-36, 8), (-25.126602828, 4.5))
            Line((-25.126602828, 4.5), (-28.063508327, 4.5))
            ThreePointArc((-28.063508327, 4.5), (-34, 8), (-28.063508327, 11.5))
        make_face()
        with BuildLine():
            ThreePointArc((25.126602828, 4.5), (36, 8), (25.126602828, 11.5))
            Line((25.126602828, 11.5), (28.063508327, 11.5))
            ThreePointArc((28.063508327, 11.5), (34, 8), (28.063508327, 4.5))
            Line((28.063508327, 4.5), (25.126602828, 4.5))
        make_face()
    extrude(amount=MIRROR4_3_DEPTH)

    # Mirror4 4 outline → Mirror4 4 (add)
    with BuildSketch(Plane(origin=(0, 0, 0), x_dir=(1, 0, 0), z_dir=(0, 1, 0)).offset(MIRROR4_START)):
        with BuildLine():
            Line((0, -11.5), (28.063508327, -11.5))
            ThreePointArc((28.063508327, -11.5), (34, -8), (28.063508327, -4.5))
            Line((28.063508327, -4.5), (0, -4.5))
            Line((0, -4.5), (0, -11.5))
        make_face()
        with BuildLine():
            Line((28.063508327, 11.5), (-28.063508327, 11.5))
            ThreePointArc((-28.063508327, 11.5), (-34, 8), (-28.063508327, 4.5))
            Line((-28.063508327, 4.5), (28.063508327, 4.5))
            ThreePointArc((28.063508327, 4.5), (34, 8), (28.063508327, 11.5))
        make_face()
    extrude(amount=MIRROR4_4_DEPTH)

    # Mirror4 5 outline → Mirror4 5 (cut)
    with BuildSketch(Plane.XY.offset(MIRROR4_START_3)):
        with BuildLine():
            Line((26, 11), (-26, 11))
            Line((-26, 11), (-19.414499368, 8.603073792))
            ThreePointArc((-19.414499368, 8.603073792), (-17.730779711, 8.15192247), (-15.994297935, 8))
            Line((-15.994297935, 8), (15.994297935, 8))
            ThreePointArc((15.994297935, 8), (17.730779711, 8.15192247), (19.414499368, 8.603073792))
            Line((19.414499368, 8.603073792), (26, 11))
        make_face()
        with BuildLine():
            Line((20.32871818, 10), (19.072479224, 9.542766413))
            ThreePointArc((19.072479224, 9.542766413), (17.557131534, 9.136730223), (15.994297935, 9))
            Line((15.994297935, 9), (-15.994297935, 9))
            ThreePointArc((-15.994297935, 9), (-17.557131534, 9.136730223), (-19.072479224, 9.542766413))
            Line((-19.072479224, 9.542766413), (-20.32871818, 10))
            Line((-20.32871818, 10), (20.32871818, 10))
        make_face(mode=Mode.SUBTRACT)
    extrude(amount=MIRROR4_5_DEPTH, mode=Mode.SUBTRACT)

    # Mirror4 6 outline → Mirror4 6 (cut)
    with BuildSketch(Plane.XY.offset(MIRROR4_START_4)):
        with BuildLine():
            Line((0, 10), (20.32871818, 10))
            Line((20.32871818, 10), (19.072479224, 9.542766413))
            ThreePointArc((19.072479224, 9.542766413), (17.557131534, 9.136730223), (15.994297935, 9))
            Line((15.994297935, 9), (0, 9))
            Line((0, 9), (0, 8))
            Line((0, 8), (15.994297935, 8))
            ThreePointArc((15.994297935, 8), (17.730779711, 8.15192247), (19.414499368, 8.603073792))
            Line((19.414499368, 8.603073792), (26, 11))
            Line((26, 11), (0, 11))
            Line((0, 11), (0, 10))
        make_face()
    extrude(amount=MIRROR4_6_DEPTH, mode=Mode.SUBTRACT)

    # Sketch2 → Cut-Extrude1 (cut)
    with BuildSketch(Plane(origin=(0, 0, 0), x_dir=(1, 0, 0), z_dir=(0, 1, 0))):
        with Locations(Location((-30, 0, 0), (0, 0, 270))):
            Circle(SKETCH2_R)
        with Locations(Location((30, 0, 0), (0, 0, 270))):
            Circle(SKETCH2_R)
        Rectangle(SKETCH2_W, SKETCH2_H)
    extrude(amount=CUT_EXTRUDE1_DEPTH, mode=Mode.SUBTRACT)

    # Sketch7 → Boss-Extrude5 (add)
    with BuildSketch(Plane(origin=(0, 0, 0), x_dir=(1, 0, 0), z_dir=(0, 1, 0)).offset(BOSS_EXTRUDE5_START)):
        with BuildLine():
            Line((-8, -12), (8, -12))
            ThreePointArc((8, -12), (10.828427125, -10.828427125), (12, -8))
            Line((12, -8), (12, 8))
            ThreePointArc((12, 8), (10.828427125, 10.828427125), (8, 12))
            Line((8, 12), (-8, 12))
            ThreePointArc((-8, 12), (-10.828427125, 10.828427125), (-12, 8))
            Line((-12, 8), (-12, -8))
            ThreePointArc((-12, -8), (-10.828427125, -10.828427125), (-8, -12))
        make_face()
    extrude(amount=BOSS_EXTRUDE5_DEPTH)

    # Sketch8 → Cut-Extrude3 (cut)
    with BuildSketch(Plane(origin=(0, 60, 0), x_dir=(1, 0, 0), z_dir=(0, 1, 0))):
        with Locations(Location((-8.5, 8.5, 0), (0, 0, 270))):
            Circle(SKETCH8_R)
        with Locations(Location((-8.5, -8.5, 0), (0, 0, 270))):
            Circle(SKETCH8_R)
        with Locations(Location((8.5, 8.5, 0), (0, 0, 270))):
            Circle(SKETCH8_R)
        with Locations(Location((8.5, -8.5, 0), (0, 0, 270))):
            Circle(SKETCH8_R)
    extrude(amount=-CUT_EXTRUDE3_DEPTH, mode=Mode.SUBTRACT)

    # Sketch9 → Cut-Extrude4 (cut)
    with BuildSketch(Plane(origin=(0, 10, 0), x_dir=(1, 0, 0), z_dir=(0, 1, 0))):
        with Locations(Location((-36.36, 13.86, 0), (0, 0, 270))):
            Circle(SKETCH9_R)
    cut_extrude4 = extrude(amount=-CUT_EXTRUDE4_DEPTH, mode=Mode.SUBTRACT)

    # Mirror5: Cut-Extrude4 across plane
    add(cut_extrude4.mirror(Plane.XY), mode=Mode.SUBTRACT)

    # Mirror5 at the second plane: Cut-Extrude4 across plane
    add(cut_extrude4.mirror(Plane(origin=(0, 0, 0), x_dir=(0, 0, 1), z_dir=(1, 0, 0))), mode=Mode.SUBTRACT)

    # Mirror5 at the second plane copy 1 sketc → Mirror5 at the second plane copy 1 (cut)
    with BuildSketch(Plane(origin=(0, 10, 0), x_dir=(-1, 0, 0), z_dir=(0, 1, 0))):
        with Locations(Location((-36.36, 13.86, 0), (0, 0, 270))):
            Circle(MIRROR5_AT_THE_SECOND_PLANE_COPY_1_SKETC_R)
    extrude(amount=-MIRROR5_AT_THE_SECOND_PLANE_COPY_1_DEPTH, mode=Mode.SUBTRACT)


solid = part.part
